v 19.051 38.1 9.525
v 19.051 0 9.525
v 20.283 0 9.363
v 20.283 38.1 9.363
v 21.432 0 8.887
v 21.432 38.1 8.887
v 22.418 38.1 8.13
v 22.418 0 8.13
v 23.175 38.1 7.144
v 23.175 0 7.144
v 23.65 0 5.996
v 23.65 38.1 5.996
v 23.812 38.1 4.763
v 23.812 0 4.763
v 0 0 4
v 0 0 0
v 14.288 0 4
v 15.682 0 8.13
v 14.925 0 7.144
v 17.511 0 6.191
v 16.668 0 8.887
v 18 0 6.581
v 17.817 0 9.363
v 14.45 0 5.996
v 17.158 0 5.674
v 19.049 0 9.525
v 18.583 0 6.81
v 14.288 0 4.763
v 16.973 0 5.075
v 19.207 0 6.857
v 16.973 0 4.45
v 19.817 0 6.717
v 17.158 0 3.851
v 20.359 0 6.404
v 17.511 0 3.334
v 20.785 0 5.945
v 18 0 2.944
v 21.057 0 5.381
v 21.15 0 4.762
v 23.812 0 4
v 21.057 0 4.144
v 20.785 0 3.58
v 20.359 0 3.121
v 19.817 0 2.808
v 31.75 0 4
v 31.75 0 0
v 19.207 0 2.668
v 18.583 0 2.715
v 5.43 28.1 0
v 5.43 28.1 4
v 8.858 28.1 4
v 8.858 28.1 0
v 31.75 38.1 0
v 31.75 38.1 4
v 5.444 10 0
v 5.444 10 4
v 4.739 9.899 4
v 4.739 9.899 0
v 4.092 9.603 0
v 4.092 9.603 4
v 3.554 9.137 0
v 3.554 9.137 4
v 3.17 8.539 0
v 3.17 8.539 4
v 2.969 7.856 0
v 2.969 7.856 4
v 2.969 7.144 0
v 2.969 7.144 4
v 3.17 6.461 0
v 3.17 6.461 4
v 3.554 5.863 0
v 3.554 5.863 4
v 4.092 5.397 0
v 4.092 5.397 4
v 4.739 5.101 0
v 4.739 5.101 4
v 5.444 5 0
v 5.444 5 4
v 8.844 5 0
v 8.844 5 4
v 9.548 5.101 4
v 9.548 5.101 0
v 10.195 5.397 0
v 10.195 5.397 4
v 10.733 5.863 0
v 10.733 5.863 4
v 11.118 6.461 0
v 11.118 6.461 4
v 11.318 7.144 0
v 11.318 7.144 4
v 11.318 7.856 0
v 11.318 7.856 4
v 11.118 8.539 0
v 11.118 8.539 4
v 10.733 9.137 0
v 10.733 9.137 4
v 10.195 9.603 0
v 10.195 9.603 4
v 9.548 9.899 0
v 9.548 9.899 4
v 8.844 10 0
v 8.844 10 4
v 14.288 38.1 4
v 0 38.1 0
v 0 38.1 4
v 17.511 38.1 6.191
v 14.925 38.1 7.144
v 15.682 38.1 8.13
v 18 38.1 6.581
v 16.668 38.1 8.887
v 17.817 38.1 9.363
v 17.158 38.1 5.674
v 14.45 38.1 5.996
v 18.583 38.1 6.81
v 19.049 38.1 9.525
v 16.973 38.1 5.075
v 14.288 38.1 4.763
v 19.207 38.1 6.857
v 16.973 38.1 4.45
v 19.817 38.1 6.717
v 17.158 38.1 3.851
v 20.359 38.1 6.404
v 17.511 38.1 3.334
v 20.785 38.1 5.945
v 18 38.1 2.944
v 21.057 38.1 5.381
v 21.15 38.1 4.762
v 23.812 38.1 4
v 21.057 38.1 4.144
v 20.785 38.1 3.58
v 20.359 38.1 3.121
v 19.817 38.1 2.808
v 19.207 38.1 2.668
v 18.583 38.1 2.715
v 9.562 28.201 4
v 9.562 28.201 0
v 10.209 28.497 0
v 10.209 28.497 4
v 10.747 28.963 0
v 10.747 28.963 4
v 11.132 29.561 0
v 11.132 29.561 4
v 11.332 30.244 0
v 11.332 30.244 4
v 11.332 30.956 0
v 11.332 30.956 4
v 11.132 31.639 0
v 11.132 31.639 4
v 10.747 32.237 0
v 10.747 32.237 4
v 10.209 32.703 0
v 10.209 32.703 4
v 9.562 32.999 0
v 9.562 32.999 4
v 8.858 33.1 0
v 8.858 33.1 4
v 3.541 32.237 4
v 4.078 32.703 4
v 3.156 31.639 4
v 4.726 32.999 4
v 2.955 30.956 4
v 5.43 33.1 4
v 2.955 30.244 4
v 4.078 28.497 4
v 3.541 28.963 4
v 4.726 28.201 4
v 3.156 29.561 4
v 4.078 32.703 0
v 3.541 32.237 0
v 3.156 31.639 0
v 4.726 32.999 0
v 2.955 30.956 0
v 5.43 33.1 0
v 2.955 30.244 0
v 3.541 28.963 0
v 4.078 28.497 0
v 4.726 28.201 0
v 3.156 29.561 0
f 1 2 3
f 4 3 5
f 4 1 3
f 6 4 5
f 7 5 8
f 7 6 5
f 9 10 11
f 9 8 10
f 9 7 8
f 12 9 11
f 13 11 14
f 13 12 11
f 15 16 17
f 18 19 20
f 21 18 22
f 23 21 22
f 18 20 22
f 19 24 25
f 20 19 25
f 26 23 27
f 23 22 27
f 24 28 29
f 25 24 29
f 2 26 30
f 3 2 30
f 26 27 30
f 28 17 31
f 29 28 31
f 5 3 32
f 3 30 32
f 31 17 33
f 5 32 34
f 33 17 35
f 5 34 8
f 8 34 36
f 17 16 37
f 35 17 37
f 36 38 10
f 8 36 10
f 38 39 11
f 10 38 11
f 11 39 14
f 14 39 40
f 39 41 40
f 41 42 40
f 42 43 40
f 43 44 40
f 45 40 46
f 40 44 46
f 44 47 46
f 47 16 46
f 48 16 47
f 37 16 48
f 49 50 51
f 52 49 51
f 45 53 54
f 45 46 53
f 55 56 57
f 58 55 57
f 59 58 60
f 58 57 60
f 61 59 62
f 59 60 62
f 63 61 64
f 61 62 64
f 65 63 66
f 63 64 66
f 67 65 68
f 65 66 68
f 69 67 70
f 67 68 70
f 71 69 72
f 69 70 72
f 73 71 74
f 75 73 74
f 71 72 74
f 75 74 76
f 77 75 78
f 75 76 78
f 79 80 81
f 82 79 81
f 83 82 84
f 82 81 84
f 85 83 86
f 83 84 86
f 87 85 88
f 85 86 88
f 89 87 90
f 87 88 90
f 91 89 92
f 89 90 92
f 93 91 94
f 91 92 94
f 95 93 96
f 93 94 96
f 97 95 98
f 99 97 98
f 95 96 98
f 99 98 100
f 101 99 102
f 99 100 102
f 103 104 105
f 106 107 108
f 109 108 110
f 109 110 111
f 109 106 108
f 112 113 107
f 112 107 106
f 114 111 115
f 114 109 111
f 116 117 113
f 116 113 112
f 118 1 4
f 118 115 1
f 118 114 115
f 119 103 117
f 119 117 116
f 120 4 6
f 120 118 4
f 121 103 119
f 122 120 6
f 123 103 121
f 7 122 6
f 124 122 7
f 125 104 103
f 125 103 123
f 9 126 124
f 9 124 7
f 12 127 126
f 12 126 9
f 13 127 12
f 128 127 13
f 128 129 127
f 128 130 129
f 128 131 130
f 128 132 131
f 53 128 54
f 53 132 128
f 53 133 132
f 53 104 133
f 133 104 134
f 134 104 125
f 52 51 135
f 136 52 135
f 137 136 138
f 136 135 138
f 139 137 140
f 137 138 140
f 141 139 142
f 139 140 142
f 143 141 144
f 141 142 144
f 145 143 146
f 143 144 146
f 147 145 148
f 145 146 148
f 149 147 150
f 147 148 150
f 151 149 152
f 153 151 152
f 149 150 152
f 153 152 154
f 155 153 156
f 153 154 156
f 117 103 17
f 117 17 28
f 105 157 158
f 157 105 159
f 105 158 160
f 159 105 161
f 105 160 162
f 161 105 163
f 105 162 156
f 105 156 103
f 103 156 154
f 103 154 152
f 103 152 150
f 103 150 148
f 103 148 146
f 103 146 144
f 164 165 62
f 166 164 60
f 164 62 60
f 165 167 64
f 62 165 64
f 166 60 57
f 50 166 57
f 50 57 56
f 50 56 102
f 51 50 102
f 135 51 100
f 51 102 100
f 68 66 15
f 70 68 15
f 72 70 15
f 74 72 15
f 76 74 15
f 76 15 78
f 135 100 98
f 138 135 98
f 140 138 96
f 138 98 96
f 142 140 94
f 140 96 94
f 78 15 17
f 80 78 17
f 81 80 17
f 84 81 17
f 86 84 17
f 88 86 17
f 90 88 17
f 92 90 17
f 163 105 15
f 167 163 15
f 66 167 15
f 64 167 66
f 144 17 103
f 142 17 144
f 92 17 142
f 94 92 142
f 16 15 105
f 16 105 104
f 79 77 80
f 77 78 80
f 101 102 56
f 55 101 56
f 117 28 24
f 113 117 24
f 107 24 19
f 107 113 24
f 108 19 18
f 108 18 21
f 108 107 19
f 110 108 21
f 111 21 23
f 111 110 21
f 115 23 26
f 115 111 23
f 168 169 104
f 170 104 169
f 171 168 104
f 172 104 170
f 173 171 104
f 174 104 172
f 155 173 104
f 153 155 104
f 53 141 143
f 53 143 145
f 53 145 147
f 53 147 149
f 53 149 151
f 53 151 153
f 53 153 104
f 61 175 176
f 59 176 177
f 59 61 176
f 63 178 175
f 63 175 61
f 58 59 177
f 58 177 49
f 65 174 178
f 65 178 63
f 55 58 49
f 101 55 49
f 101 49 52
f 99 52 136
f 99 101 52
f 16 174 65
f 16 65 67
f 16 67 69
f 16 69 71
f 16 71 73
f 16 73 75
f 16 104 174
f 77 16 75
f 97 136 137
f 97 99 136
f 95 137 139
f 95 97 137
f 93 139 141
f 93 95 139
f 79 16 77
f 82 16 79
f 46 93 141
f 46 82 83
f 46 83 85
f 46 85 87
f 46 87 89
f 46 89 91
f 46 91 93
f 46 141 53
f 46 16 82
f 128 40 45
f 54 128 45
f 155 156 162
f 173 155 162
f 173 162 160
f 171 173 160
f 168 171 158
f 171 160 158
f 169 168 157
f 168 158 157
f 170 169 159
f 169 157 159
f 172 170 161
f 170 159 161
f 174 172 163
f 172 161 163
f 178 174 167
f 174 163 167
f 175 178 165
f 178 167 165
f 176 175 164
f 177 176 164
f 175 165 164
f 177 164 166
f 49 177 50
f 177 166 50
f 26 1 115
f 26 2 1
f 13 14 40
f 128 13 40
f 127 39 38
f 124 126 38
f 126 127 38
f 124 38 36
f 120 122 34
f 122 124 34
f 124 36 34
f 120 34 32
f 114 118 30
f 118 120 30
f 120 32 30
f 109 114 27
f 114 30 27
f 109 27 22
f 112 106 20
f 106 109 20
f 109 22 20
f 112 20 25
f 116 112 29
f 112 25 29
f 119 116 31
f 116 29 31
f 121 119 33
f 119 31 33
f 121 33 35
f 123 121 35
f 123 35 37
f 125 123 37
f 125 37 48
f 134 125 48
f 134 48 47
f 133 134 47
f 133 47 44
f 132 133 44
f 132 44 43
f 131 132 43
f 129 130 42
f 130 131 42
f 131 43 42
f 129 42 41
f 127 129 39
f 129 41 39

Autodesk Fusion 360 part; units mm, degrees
sketch "Sketch2" plane through (0, 0, 0) normal (0, 1, 0) x (1, 0, 0)
  line L0 (0, 0) -> (31.75, 0)
  line L1 (31.75, 0) -> (31.75, -9.525)
  line L2 (31.75, -9.525) -> (0, -9.525)
  line L3 (0, -9.525) -> (0, 0)
  circle A0 centre (19.05, -4.7625) radius 2.1
  line L4 (23.8125, 0) -> (14.2875, 0)
  line L5 (14.2875, 0) -> (14.2875, -9.525)
  line L6 (14.2875, -9.525) -> (23.8125, -9.525)
  line L7 (23.8125, -9.525) -> (23.8125, 0)
  line L8 (23.8125, 0) -> (14.2875, -9.525) construction
  line L9 (14.2875, 0) -> (23.8125, -9.525) construction
  line L10 (0, -4) -> (14.2875, -4)
  line L11 (23.8125, -4) -> (31.75, -4)
  point P0 (19.05, -4.7625)
  dimension "d1" = 31.75
  dimension "d2" = 9.525
  dimension "d3" = 4.2
  dimension "d4" = 4.7625
  dimension "d5" = 19.05
  dimension "d8" = 9.525
  dimension "d9" = 9.525
  dimension "d10" = 4
  dimension "d11" = 4
extrude "Extrude1" add sketch "Sketch2" along normal blind 38.1 contours L0 L3 L5 L10 | L0 L2 L4 L5 L6 L7 | L0 L1 L7 L11
fillet "Fillet1" radius 4.7625 2 edges at (14.2875, 19.05, 9.525) (23.8125, 19.05, 9.525)
sketch "Sketch3" plane through (0, 0, 4) normal (0, 0, 1) x (-1, 0, 0)
  line L0 (0, 0) -> (-14.2875, 0)
  line L1 (-14.2875, 0) -> (-14.2875, -38.1)
  line L2 (-14.2875, -38.1) -> (0, -38.1)
  line L3 (0, -38.1) -> (0, 0)
sketch "Sketch4" plane through (0, 0, 4) normal (0, 0, 1) x (-1, 0, 0)
sketch "Sketch5" plane through (0, 0, 4) normal (0, 0, 1) x (-1, 0, 0)
  line L0 (-14.2875, -38.1) -> (0, -38.1) construction
  line L1 (0, -38.1) -> (0, 0) construction
  line L2 (0, 0) -> (-14.2875, 0) construction
  line L3 (-14.2875, 0) -> (-14.2875, -38.1) construction
  line L4 (-7.1437, -38.1) -> (-7.1437, 0) construction
  line L5 (-7.1437, -27.2901) -> (0, -27.2901) construction
  line L6 (-7.1437, -27.2901) -> (-14.2875, -27.2901) construction
  line L7 (-5.4299, -28.1) -> (-8.8576, -28.1)
  arc A0 (-8.8576, -28.1) -> (-8.8576, -33.1) centre (-8.8576, -30.6) ccw
  line L8 (-8.8576, -33.1) -> (-5.4299, -33.1)
  arc A1 (-5.4299, -33.1) -> (-5.4299, -28.1) centre (-5.4299, -30.6) ccw
  line L9 (-5.4299, -30.6) -> (-8.8576, -30.6) construction
  line L10 (-5.4437, -5) -> (-8.8438, -5)
  arc A2 (-8.8438, -5) -> (-8.8438, -10) centre (-8.8438, -7.5) ccw
  line L11 (-8.8438, -10) -> (-5.4437, -10)
  arc A3 (-5.4437, -10) -> (-5.4437, -5) centre (-5.4437, -7.5) ccw
  line L12 (-5.4437, -7.5) -> (-8.8438, -7.5) construction
  point P0 (0, -38.1)
  point P1 (-14.2875, -38.1)
  point P2 (-14.2875, 0)
  point P3 (-7.1437, -30.6)
  point P4 (-7.1438, -7.5)
  dimension "d14" = 5
  dimension "d16" = 5
  dimension "d19" = 7.5
  dimension "d20" = 7.5
extrude "Extrude2" cut sketch "Sketch5" against normal blind 4
